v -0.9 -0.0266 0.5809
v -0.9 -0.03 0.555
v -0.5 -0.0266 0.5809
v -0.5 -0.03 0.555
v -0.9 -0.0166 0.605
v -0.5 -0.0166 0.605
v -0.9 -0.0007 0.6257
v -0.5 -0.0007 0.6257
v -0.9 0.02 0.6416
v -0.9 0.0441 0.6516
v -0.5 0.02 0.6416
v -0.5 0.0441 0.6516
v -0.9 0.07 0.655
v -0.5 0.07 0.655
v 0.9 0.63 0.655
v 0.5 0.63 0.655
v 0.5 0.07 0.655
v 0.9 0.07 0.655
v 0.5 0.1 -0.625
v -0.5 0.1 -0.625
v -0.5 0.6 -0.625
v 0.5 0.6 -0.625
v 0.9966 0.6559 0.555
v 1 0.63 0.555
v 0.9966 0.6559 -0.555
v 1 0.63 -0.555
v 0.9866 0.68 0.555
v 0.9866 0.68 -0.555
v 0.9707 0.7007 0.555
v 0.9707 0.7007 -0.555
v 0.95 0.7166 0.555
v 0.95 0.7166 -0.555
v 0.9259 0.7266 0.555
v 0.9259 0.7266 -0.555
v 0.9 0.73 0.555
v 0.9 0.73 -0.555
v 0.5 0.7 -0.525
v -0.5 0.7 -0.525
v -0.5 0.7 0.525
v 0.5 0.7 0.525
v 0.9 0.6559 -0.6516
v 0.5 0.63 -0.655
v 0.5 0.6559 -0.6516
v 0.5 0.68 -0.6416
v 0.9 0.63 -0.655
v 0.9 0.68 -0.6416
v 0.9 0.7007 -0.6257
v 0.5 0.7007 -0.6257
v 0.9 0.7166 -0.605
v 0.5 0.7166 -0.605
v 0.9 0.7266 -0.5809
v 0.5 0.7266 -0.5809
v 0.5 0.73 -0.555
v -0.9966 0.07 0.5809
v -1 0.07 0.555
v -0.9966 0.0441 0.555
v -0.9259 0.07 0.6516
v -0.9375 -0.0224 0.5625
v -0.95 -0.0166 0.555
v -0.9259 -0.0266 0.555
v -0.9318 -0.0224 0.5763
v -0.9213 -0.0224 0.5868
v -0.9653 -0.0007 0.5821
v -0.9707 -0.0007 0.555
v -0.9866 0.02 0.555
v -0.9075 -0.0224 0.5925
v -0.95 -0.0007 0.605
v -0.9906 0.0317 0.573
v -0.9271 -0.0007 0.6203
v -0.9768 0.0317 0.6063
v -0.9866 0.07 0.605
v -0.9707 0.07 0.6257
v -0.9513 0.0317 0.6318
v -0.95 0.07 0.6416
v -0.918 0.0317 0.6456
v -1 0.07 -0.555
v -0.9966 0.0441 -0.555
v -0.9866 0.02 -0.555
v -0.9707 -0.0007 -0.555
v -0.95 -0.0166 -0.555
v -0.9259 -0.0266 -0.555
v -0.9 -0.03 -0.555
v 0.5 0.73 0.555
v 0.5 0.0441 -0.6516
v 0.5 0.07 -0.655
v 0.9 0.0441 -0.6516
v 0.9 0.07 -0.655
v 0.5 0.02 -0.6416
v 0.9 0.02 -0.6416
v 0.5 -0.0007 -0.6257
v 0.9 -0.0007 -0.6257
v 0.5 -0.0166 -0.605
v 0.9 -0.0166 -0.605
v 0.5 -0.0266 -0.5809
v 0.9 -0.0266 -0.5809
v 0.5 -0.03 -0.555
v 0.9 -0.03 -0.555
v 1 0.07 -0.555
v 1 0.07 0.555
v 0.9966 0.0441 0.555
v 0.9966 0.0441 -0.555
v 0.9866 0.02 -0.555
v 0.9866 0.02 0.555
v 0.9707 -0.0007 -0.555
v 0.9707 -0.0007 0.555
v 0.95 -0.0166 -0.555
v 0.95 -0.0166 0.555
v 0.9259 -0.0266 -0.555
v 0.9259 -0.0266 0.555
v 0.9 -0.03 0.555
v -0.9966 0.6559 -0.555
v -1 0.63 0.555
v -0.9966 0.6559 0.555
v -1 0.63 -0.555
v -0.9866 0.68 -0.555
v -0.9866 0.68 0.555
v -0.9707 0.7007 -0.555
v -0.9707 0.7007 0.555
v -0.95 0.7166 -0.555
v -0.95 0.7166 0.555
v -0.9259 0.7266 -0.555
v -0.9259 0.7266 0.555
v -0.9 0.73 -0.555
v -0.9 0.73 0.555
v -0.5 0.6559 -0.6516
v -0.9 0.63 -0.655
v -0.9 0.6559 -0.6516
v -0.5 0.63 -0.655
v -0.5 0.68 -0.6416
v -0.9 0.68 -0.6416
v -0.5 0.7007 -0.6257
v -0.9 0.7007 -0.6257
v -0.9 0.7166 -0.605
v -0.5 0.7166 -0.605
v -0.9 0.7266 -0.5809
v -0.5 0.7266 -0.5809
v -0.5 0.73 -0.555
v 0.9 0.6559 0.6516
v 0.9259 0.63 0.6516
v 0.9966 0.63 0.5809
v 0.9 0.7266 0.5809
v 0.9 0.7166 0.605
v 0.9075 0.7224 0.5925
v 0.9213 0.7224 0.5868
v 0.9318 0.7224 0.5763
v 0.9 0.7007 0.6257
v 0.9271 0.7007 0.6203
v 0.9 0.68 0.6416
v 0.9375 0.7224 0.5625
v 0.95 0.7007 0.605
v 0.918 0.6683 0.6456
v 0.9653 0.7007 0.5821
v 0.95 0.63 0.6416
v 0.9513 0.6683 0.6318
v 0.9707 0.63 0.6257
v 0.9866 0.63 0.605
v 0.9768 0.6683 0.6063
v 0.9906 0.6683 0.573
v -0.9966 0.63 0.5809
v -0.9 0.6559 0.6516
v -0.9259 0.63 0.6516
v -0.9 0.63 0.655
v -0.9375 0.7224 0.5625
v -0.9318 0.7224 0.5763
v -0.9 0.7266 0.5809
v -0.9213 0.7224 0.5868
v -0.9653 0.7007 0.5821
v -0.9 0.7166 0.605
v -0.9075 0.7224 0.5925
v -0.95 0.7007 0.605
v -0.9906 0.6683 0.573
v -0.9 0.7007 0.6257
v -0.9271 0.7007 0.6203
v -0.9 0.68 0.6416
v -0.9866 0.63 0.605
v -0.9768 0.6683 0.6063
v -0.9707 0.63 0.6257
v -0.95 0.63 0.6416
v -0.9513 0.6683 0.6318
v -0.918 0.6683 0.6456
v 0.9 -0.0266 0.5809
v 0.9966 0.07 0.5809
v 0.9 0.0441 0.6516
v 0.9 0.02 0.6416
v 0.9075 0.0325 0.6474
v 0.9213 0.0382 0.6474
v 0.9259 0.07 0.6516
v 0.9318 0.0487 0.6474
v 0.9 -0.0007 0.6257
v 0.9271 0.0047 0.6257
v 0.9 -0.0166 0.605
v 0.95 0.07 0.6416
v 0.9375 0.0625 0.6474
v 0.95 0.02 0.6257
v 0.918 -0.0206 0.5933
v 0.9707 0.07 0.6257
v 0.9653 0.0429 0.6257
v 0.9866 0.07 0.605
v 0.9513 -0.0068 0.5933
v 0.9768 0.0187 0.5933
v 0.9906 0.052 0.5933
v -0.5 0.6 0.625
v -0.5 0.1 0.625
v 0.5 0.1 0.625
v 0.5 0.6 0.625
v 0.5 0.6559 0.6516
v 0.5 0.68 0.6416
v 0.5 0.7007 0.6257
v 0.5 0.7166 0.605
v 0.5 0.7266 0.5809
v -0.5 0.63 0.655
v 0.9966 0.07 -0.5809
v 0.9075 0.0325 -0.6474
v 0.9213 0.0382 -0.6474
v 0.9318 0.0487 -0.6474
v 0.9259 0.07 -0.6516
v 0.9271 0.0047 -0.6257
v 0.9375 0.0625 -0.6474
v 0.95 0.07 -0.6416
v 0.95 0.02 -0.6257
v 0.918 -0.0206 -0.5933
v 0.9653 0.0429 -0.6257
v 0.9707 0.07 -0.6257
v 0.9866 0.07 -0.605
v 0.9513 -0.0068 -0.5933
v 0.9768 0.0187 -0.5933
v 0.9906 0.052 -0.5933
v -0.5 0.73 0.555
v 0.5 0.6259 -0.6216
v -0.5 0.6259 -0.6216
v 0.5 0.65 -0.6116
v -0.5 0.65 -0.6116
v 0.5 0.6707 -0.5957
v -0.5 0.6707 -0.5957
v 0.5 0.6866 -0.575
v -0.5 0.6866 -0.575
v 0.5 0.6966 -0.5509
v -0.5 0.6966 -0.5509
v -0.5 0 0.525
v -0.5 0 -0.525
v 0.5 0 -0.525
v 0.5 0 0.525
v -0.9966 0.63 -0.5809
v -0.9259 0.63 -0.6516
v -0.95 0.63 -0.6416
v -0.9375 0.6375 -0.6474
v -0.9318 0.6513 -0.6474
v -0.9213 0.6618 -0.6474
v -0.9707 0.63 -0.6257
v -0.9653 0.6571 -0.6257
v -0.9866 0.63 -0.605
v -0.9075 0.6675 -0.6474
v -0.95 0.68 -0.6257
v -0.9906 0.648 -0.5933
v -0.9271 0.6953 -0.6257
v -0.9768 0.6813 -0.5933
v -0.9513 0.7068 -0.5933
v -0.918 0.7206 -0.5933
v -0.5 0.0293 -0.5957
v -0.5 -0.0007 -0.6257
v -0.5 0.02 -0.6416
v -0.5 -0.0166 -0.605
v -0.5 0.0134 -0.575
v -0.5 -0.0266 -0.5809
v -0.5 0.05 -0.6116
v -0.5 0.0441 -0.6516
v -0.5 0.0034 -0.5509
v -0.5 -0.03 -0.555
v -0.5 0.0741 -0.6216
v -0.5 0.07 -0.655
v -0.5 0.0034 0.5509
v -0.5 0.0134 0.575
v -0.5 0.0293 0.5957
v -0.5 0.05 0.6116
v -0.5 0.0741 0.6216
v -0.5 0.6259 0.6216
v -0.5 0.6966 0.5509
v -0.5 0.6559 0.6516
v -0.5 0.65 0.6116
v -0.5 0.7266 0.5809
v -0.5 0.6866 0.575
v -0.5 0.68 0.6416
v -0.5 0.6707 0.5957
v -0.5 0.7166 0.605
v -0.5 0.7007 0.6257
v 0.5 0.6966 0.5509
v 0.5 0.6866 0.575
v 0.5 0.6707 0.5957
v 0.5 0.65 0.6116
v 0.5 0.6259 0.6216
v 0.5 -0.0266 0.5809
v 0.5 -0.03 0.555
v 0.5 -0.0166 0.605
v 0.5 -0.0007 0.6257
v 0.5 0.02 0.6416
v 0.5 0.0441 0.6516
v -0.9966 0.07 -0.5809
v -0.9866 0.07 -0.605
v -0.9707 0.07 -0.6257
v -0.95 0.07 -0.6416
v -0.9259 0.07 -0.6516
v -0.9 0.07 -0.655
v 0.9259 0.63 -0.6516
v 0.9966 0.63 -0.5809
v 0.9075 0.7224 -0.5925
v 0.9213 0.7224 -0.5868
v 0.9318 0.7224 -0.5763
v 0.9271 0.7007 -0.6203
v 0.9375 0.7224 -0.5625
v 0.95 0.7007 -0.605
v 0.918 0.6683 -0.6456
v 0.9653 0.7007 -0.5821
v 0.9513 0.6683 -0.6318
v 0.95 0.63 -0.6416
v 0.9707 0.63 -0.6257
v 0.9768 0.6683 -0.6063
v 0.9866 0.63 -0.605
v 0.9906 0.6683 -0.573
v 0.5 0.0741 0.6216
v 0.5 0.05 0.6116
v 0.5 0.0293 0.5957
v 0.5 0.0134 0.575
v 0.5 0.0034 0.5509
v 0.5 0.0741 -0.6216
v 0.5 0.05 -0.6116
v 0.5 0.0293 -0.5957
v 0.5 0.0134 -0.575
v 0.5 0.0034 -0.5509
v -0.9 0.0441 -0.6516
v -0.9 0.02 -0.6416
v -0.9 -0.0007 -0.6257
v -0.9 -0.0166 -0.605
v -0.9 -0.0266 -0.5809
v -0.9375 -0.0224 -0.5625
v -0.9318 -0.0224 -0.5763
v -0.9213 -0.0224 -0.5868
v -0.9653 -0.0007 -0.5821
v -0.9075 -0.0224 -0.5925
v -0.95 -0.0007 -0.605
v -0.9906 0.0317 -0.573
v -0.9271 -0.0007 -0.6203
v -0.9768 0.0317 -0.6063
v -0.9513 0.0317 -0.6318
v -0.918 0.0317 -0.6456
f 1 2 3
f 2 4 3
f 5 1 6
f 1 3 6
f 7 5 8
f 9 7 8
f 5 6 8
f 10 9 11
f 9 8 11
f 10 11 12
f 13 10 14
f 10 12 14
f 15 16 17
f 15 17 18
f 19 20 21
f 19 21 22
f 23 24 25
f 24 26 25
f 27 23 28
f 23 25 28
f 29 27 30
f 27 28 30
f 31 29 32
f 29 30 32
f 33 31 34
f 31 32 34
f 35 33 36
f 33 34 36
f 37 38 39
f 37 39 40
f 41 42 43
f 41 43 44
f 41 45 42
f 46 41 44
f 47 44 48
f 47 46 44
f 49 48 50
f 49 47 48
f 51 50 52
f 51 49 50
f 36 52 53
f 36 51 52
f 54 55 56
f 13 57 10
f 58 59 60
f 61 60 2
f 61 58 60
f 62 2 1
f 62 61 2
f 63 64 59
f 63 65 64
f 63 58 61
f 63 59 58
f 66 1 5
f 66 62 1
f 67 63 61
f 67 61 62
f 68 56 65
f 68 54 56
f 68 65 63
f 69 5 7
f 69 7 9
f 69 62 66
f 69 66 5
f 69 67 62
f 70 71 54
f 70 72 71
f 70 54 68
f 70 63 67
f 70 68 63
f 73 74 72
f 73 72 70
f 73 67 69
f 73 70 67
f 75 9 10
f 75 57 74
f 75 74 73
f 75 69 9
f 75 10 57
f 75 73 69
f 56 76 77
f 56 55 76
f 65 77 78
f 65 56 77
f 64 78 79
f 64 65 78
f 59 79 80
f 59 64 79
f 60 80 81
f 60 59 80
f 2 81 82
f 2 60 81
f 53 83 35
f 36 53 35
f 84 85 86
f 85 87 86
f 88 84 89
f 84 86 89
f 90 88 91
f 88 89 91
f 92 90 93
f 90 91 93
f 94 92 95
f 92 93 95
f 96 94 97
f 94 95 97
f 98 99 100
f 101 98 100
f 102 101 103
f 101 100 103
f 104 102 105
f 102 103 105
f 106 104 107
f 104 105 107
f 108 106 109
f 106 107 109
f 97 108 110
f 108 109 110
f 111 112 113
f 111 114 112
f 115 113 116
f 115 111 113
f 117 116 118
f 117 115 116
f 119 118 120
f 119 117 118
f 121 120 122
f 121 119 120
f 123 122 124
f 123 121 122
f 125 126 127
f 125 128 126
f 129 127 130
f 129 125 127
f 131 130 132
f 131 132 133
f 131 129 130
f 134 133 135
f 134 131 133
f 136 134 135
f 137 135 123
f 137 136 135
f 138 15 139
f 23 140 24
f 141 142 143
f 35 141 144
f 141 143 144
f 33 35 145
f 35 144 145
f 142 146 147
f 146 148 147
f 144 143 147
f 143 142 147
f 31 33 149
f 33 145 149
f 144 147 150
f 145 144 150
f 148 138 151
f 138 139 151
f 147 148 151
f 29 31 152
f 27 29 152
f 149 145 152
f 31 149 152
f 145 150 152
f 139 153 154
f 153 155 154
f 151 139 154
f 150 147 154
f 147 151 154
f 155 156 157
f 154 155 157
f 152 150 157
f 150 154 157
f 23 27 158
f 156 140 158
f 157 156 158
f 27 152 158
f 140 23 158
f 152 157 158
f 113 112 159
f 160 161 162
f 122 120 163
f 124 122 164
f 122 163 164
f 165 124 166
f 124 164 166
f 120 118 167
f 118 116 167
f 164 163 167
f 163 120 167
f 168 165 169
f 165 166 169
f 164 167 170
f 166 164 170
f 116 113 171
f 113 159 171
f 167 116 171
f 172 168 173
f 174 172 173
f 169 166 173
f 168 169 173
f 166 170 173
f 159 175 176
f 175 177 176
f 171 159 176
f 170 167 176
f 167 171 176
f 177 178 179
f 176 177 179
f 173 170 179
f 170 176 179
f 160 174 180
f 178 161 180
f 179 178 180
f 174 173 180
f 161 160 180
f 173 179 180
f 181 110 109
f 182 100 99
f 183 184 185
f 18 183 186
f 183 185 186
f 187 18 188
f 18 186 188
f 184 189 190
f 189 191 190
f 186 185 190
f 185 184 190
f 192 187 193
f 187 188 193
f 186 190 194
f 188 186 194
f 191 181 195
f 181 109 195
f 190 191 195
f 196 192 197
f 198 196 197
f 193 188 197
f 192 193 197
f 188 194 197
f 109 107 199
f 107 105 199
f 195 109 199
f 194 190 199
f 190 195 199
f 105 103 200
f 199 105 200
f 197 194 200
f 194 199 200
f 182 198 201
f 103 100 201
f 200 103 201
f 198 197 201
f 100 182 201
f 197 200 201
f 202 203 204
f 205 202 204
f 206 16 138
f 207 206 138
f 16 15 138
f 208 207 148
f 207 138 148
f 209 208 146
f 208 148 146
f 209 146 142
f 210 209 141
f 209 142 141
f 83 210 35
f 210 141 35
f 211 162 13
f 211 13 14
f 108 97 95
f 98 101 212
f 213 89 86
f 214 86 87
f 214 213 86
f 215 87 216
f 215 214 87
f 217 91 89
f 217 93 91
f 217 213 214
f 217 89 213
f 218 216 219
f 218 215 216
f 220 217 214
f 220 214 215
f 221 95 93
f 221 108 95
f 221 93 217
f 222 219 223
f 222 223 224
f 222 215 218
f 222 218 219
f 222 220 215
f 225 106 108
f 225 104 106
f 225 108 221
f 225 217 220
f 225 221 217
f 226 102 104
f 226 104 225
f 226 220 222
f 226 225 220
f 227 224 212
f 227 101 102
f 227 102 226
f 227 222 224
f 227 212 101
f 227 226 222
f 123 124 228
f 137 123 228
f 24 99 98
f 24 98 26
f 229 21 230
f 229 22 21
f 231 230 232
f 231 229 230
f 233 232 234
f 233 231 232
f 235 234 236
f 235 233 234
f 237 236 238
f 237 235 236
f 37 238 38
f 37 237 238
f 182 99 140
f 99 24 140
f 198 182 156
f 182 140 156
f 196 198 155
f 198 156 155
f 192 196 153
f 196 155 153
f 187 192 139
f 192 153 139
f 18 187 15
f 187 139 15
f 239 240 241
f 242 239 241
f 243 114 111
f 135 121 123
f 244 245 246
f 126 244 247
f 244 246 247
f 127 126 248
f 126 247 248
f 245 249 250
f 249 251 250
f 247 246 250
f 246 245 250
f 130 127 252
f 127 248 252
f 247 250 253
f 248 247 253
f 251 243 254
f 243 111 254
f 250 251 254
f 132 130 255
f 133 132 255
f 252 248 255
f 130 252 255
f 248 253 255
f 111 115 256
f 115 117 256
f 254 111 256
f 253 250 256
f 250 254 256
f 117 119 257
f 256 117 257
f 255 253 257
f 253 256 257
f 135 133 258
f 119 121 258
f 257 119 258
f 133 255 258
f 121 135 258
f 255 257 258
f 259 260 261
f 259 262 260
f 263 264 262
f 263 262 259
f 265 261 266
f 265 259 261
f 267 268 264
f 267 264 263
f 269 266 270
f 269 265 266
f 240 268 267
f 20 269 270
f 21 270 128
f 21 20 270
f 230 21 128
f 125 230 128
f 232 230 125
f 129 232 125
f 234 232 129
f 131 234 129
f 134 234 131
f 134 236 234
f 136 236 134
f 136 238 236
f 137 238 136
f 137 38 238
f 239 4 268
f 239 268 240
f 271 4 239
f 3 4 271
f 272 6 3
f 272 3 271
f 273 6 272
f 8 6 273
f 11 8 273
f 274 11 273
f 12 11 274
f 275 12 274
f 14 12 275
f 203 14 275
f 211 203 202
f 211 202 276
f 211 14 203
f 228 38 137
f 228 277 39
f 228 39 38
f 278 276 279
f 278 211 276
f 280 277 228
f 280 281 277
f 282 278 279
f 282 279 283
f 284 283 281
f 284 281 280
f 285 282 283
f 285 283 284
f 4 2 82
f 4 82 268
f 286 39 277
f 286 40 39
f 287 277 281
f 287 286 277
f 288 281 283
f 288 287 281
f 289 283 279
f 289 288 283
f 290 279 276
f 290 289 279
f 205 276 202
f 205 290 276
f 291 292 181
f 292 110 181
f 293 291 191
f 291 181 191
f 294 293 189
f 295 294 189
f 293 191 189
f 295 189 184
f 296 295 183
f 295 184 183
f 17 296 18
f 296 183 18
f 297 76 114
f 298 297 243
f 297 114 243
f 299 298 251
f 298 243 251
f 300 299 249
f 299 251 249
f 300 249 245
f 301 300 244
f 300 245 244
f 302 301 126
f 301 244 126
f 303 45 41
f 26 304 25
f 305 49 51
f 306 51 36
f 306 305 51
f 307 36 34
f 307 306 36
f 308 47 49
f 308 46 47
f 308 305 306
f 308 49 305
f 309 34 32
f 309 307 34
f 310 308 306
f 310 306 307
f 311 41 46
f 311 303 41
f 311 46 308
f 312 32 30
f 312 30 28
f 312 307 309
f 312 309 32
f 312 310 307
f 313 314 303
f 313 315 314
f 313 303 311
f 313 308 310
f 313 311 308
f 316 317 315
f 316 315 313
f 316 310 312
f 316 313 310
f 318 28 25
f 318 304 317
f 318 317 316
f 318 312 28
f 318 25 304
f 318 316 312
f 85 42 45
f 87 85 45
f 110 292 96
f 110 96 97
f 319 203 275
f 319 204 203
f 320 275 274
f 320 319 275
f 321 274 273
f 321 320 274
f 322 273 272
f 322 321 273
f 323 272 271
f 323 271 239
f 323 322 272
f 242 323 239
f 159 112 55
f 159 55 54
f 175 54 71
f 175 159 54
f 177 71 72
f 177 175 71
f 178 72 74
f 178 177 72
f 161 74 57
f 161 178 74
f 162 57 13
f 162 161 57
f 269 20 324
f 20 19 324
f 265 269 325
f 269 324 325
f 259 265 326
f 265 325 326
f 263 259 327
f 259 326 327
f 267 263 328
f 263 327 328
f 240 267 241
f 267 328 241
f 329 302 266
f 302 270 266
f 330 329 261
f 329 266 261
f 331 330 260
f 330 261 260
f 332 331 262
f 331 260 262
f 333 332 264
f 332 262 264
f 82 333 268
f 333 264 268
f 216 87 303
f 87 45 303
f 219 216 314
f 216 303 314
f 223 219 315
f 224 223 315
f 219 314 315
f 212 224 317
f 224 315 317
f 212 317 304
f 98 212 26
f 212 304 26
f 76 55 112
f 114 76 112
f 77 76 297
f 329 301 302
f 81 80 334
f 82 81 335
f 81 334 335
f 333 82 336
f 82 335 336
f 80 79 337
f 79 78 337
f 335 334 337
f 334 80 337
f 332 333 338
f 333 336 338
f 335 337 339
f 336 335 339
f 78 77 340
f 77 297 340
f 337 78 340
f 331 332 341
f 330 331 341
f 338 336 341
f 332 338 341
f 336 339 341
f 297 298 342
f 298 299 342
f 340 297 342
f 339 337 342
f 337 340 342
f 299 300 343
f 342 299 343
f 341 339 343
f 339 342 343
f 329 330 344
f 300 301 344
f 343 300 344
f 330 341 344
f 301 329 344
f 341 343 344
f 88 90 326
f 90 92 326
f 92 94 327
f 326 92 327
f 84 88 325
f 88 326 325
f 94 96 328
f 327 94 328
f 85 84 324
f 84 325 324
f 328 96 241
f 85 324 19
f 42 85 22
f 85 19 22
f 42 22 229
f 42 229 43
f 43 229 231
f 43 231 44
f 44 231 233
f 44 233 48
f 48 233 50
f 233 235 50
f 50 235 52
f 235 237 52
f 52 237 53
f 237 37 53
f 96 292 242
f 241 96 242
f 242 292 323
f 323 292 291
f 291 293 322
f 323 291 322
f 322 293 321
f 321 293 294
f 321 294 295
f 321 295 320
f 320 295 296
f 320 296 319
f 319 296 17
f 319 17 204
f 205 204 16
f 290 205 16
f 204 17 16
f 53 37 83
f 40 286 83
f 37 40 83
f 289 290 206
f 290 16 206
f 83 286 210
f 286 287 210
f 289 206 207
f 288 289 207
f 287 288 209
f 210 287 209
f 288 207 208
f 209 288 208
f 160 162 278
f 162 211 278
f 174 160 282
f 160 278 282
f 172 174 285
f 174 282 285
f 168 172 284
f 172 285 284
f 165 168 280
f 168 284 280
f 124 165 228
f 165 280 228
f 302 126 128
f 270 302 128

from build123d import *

# Parameters (mm, degrees)
SKETCH1_W           = 2
SKETCH1_H           = 1.25
EXTRUDE1_DEPTH      = 0.7
SKETCH2_W           = 0.5
SKETCH2_H           = 0.76
EXTRUDE2_DEPTH      = 0.655
EXTRUDE2_DEPTH_BACK = 0.655
FILLET1_R           = 0.1


with BuildPart() as part:
    # Sketch1 → Extrude1 (new body)
    with BuildSketch(Plane(origin=(0, 0, 0), x_dir=(1, 0, 0), z_dir=(0, 1, 0))):
        Rectangle(SKETCH1_W, SKETCH1_H)
    extrude(amount=EXTRUDE1_DEPTH)

    # Sketch2 → Extrude2 (add, two sides)
    with BuildSketch(Plane.XY) as extrude2_sk:
        with Locations((-0.75, 0.35)):
            Rectangle(SKETCH2_W, SKETCH2_H)
        with Locations((0.75, 0.35)):
            Rectangle(SKETCH2_W, SKETCH2_H)
    extrude(amount=EXTRUDE2_DEPTH)
    extrude(extrude2_sk.sketch, amount=-EXTRUDE2_DEPTH_BACK)

    # Fillet1
    fillet1_edges = [part.edges().sort_by_distance(p)[0] for p in [
        (-1, 0.35, 0.655),
        (-1, 0.73, 0),
        (-1, 0.35, -0.655),
        (-1, -0.03, 0),
        (-0.75, 0.73, 0.655),
        (-0.75, -0.03, 0.655),
        (-0.75, 0.73, -0.655),
        (-0.75, -0.03, -0.655),
        (0, 0, 0.625),
        (0, 0, -0.625),
        (0, 0.7, 0.625),
        (0, 0.7, -0.625),
        (1, -0.03, 0),
        (0.75, -0.03, 0.655),
        (0.75, -0.03, -0.655),
        (1, 0.35, 0.655),
        (0.75, 0.73, 0.655),
        (1, 0.35, -0.655),
        (0.75, 0.73, -0.655),
        (1, 0.73, 0),
    ]]
    fillet(fillet1_edges, radius=FILLET1_R)


solid = part.part
